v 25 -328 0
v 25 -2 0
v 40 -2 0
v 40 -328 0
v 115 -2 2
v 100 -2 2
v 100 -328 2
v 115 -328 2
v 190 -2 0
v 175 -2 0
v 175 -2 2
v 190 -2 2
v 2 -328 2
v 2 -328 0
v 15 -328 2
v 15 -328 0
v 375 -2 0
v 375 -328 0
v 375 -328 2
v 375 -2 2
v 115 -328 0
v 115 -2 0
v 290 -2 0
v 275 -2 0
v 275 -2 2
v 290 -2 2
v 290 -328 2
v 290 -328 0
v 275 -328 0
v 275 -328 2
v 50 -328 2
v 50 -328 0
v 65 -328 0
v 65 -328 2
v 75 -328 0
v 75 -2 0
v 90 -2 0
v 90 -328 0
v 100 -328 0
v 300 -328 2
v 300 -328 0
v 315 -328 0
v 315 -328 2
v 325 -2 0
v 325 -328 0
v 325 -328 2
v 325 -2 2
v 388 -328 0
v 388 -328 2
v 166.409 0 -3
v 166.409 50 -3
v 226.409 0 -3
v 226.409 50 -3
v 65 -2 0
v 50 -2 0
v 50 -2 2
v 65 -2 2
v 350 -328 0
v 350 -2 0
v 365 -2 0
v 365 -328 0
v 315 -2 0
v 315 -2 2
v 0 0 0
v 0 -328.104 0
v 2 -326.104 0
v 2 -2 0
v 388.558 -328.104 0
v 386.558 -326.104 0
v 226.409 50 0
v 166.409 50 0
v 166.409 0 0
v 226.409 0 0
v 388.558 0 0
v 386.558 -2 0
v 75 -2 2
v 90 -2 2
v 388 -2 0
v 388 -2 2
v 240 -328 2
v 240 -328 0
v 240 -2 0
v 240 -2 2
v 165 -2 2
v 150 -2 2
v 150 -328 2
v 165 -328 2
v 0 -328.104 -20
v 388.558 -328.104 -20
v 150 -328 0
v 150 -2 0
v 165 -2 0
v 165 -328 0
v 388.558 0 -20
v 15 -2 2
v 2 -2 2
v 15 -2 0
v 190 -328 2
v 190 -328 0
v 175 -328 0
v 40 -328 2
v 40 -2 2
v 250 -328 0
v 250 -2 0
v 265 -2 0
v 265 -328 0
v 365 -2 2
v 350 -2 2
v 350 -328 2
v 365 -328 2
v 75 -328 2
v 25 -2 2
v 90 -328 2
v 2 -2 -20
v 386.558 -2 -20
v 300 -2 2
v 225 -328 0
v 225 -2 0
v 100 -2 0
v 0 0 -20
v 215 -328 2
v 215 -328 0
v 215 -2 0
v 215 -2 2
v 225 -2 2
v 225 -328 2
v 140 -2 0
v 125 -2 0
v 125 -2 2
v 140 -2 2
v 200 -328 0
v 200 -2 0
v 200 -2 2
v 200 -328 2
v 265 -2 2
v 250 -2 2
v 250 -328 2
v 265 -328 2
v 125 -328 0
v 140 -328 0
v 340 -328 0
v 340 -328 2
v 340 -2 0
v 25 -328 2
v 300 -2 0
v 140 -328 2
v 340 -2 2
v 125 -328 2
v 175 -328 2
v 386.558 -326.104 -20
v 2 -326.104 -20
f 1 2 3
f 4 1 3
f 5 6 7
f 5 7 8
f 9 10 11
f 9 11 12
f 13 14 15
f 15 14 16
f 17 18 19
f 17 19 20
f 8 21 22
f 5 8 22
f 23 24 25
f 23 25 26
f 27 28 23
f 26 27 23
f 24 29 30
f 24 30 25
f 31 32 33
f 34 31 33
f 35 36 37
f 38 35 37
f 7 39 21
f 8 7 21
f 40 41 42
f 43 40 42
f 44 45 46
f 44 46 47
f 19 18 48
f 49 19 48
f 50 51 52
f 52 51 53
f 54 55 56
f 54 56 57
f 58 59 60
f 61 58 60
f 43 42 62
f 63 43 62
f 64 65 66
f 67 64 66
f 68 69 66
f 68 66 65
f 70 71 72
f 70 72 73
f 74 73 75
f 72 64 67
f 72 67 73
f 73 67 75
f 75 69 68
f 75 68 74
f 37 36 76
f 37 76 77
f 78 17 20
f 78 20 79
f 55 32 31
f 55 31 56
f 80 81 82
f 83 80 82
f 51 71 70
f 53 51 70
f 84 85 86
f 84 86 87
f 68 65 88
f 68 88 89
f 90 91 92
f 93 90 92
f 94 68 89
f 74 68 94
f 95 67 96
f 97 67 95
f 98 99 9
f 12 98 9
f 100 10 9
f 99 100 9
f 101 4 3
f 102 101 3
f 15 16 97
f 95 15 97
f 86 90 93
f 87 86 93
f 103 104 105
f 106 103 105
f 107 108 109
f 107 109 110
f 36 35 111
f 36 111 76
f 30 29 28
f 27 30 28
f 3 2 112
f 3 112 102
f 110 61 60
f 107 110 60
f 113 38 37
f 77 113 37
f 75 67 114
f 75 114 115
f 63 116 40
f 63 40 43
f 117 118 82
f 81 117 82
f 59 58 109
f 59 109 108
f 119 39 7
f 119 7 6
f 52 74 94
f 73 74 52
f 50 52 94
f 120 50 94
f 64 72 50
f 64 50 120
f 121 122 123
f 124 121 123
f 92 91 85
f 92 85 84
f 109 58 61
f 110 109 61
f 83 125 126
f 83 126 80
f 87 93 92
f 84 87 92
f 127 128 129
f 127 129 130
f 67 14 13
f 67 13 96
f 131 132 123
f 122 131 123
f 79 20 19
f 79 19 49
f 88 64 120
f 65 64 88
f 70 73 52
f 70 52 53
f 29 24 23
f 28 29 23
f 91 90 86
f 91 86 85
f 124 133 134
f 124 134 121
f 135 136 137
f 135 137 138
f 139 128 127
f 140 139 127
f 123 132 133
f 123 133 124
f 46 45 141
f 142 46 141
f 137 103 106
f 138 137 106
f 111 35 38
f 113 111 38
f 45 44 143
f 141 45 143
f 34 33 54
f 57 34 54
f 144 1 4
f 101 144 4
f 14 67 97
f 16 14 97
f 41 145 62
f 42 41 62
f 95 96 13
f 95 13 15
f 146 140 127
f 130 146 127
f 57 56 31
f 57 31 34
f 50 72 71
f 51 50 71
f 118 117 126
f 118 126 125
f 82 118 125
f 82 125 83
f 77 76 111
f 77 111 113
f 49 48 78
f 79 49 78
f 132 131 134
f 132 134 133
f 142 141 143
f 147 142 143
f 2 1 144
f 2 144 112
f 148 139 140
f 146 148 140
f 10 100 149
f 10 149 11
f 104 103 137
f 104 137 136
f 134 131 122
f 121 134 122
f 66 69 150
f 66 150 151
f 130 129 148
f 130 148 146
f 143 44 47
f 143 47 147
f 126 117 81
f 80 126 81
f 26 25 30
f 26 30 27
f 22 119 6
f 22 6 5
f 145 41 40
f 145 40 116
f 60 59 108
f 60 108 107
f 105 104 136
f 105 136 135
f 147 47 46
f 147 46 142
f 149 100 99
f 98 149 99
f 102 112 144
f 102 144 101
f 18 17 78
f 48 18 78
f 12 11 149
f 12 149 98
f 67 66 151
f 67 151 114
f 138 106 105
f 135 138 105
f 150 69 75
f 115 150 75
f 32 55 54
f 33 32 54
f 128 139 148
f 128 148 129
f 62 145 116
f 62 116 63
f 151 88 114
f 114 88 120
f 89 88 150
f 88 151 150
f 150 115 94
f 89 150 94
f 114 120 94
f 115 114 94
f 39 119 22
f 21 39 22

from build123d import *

# Parameters (mm, degrees)
F0_W     = 13
F0_H     = 326
F1_DEPTH = 2
F0_W_2   = 15
F2_W     = 2
F2_H     = 2
F2_H_2   = 324.104108572
F3_DEPTH = 20
F4_W     = 60
F4_H     = 50
F5_DEPTH = 3


with BuildPart() as f1:
    # F0 (on Top) → F1 (new body)
    with BuildSketch(Plane.XY):
        with Locations((8.5, -165)):
            Rectangle(F0_W, F0_H)
    extrude(amount=F1_DEPTH)


with BuildPart() as f1b:
    # F0 (on Top) → F1, piece 2 (new body)
    with BuildSketch(Plane.XY):
        with Locations((32.5, -165)):
            Rectangle(F0_W_2, F0_H)
    extrude(amount=F1_DEPTH)


with BuildPart() as f1c:
    # F0 (on Top) → F1, piece 3 (new body)
    with BuildSketch(Plane.XY):
        with Locations((57.5, -165)):
            Rectangle(F0_W_2, F0_H)
    extrude(amount=F1_DEPTH)


with BuildPart() as f1d:
    # F0 (on Top) → F1, piece 4 (new body)
    with BuildSketch(Plane.XY):
        with Locations((82.5, -165)):
            Rectangle(F0_W_2, F0_H)
    extrude(amount=F1_DEPTH)


with BuildPart() as f1e:
    # F0 (on Top) → F1, piece 5 (new body)
    with BuildSketch(Plane.XY):
        with Locations((107.5, -165)):
            Rectangle(F0_W_2, F0_H)
    extrude(amount=F1_DEPTH)


with BuildPart() as f1f:
    # F0 (on Top) → F1, piece 6 (new body)
    with BuildSketch(Plane.XY):
        with Locations((132.5, -165)):
            Rectangle(F0_W_2, F0_H)
    extrude(amount=F1_DEPTH)


with BuildPart() as f1g:
    # F0 (on Top) → F1, piece 7 (new body)
    with BuildSketch(Plane.XY):
        with Locations((157.5, -165)):
            Rectangle(F0_W_2, F0_H)
    extrude(amount=F1_DEPTH)


with BuildPart() as f1h:
    # F0 (on Top) → F1, piece 8 (new body)
    with BuildSketch(Plane.XY):
        with Locations((182.5, -165)):
            Rectangle(F0_W_2, F0_H)
    extrude(amount=F1_DEPTH)


with BuildPart() as f1i:
    # F0 (on Top) → F1, piece 9 (new body)
    with BuildSketch(Plane.XY):
        with Locations((207.5, -165)):
            Rectangle(F0_W_2, F0_H)
    extrude(amount=F1_DEPTH)


with BuildPart() as f1j:
    # F0 (on Top) → F1, piece 10 (new body)
    with BuildSketch(Plane.XY):
        with Locations((232.5, -165)):
            Rectangle(F0_W_2, F0_H)
    extrude(amount=F1_DEPTH)


with BuildPart() as f1k:
    # F0 (on Top) → F1, piece 11 (new body)
    with BuildSketch(Plane.XY):
        with Locations((257.5, -165)):
            Rectangle(F0_W_2, F0_H)
    extrude(amount=F1_DEPTH)


with BuildPart() as f1l:
    # F0 (on Top) → F1, piece 12 (new body)
    with BuildSketch(Plane.XY):
        with Locations((282.5, -165)):
            Rectangle(F0_W_2, F0_H)
    extrude(amount=F1_DEPTH)


with BuildPart() as f1m:
    # F0 (on Top) → F1, piece 13 (new body)
    with BuildSketch(Plane.XY):
        with Locations((307.5, -165)):
            Rectangle(F0_W_2, F0_H)
    extrude(amount=F1_DEPTH)


with BuildPart() as f1n:
    # F0 (on Top) → F1, piece 14 (new body)
    with BuildSketch(Plane.XY):
        with Locations((332.5, -165)):
            Rectangle(F0_W_2, F0_H)
    extrude(amount=F1_DEPTH)


with BuildPart() as f1o:
    # F0 (on Top) → F1, piece 15 (new body)
    with BuildSketch(Plane.XY):
        with Locations((357.5, -165)):
            Rectangle(F0_W_2, F0_H)
    extrude(amount=F1_DEPTH)


with BuildPart() as f1p:
    # F0 (on Top) → F1, piece 16 (new body)
    with BuildSketch(Plane.XY):
        with Locations((381.5, -165)):
            Rectangle(F0_W, F0_H)
    extrude(amount=F1_DEPTH)


with BuildPart() as f3:
    # F2 (on Top) → F3 (new body)
    with BuildSketch(Plane.XY):
        with Locations((387.5577917099, -1)):
            Rectangle(F2_W, F2_H)
        Polygon((386.5577917099, -2), (386.5577917099, 0), (0, 0), (0, -328.104108572), (386.5577917099, -328.104108572), (386.5577917099, -326.104108572), (2, -326.104108572), (2, -2), align=None)
        with Locations((387.5577917099, -164.052054286)):
            Rectangle(F2_W, F2_H_2)
        with Locations((387.5577917099, -327.104108572)):
            Rectangle(F2_W, F2_H)
    extrude(amount=-F3_DEPTH)

    # F4 (on Top) → F5 (join)
    with BuildSketch(Plane.XY):
        with Locations((196.4089343843, 25)):
            Rectangle(F4_W, F4_H)
    extrude(amount=-F5_DEPTH)


solid = Compound([f1.part, f1b.part, f1c.part, f1d.part, f1e.part, f1f.part, f1g.part, f1h.part, f1i.part, f1j.part, f1k.part, f1l.part, f1m.part, f1n.part, f1o.part, f1p.part, f3.part])
